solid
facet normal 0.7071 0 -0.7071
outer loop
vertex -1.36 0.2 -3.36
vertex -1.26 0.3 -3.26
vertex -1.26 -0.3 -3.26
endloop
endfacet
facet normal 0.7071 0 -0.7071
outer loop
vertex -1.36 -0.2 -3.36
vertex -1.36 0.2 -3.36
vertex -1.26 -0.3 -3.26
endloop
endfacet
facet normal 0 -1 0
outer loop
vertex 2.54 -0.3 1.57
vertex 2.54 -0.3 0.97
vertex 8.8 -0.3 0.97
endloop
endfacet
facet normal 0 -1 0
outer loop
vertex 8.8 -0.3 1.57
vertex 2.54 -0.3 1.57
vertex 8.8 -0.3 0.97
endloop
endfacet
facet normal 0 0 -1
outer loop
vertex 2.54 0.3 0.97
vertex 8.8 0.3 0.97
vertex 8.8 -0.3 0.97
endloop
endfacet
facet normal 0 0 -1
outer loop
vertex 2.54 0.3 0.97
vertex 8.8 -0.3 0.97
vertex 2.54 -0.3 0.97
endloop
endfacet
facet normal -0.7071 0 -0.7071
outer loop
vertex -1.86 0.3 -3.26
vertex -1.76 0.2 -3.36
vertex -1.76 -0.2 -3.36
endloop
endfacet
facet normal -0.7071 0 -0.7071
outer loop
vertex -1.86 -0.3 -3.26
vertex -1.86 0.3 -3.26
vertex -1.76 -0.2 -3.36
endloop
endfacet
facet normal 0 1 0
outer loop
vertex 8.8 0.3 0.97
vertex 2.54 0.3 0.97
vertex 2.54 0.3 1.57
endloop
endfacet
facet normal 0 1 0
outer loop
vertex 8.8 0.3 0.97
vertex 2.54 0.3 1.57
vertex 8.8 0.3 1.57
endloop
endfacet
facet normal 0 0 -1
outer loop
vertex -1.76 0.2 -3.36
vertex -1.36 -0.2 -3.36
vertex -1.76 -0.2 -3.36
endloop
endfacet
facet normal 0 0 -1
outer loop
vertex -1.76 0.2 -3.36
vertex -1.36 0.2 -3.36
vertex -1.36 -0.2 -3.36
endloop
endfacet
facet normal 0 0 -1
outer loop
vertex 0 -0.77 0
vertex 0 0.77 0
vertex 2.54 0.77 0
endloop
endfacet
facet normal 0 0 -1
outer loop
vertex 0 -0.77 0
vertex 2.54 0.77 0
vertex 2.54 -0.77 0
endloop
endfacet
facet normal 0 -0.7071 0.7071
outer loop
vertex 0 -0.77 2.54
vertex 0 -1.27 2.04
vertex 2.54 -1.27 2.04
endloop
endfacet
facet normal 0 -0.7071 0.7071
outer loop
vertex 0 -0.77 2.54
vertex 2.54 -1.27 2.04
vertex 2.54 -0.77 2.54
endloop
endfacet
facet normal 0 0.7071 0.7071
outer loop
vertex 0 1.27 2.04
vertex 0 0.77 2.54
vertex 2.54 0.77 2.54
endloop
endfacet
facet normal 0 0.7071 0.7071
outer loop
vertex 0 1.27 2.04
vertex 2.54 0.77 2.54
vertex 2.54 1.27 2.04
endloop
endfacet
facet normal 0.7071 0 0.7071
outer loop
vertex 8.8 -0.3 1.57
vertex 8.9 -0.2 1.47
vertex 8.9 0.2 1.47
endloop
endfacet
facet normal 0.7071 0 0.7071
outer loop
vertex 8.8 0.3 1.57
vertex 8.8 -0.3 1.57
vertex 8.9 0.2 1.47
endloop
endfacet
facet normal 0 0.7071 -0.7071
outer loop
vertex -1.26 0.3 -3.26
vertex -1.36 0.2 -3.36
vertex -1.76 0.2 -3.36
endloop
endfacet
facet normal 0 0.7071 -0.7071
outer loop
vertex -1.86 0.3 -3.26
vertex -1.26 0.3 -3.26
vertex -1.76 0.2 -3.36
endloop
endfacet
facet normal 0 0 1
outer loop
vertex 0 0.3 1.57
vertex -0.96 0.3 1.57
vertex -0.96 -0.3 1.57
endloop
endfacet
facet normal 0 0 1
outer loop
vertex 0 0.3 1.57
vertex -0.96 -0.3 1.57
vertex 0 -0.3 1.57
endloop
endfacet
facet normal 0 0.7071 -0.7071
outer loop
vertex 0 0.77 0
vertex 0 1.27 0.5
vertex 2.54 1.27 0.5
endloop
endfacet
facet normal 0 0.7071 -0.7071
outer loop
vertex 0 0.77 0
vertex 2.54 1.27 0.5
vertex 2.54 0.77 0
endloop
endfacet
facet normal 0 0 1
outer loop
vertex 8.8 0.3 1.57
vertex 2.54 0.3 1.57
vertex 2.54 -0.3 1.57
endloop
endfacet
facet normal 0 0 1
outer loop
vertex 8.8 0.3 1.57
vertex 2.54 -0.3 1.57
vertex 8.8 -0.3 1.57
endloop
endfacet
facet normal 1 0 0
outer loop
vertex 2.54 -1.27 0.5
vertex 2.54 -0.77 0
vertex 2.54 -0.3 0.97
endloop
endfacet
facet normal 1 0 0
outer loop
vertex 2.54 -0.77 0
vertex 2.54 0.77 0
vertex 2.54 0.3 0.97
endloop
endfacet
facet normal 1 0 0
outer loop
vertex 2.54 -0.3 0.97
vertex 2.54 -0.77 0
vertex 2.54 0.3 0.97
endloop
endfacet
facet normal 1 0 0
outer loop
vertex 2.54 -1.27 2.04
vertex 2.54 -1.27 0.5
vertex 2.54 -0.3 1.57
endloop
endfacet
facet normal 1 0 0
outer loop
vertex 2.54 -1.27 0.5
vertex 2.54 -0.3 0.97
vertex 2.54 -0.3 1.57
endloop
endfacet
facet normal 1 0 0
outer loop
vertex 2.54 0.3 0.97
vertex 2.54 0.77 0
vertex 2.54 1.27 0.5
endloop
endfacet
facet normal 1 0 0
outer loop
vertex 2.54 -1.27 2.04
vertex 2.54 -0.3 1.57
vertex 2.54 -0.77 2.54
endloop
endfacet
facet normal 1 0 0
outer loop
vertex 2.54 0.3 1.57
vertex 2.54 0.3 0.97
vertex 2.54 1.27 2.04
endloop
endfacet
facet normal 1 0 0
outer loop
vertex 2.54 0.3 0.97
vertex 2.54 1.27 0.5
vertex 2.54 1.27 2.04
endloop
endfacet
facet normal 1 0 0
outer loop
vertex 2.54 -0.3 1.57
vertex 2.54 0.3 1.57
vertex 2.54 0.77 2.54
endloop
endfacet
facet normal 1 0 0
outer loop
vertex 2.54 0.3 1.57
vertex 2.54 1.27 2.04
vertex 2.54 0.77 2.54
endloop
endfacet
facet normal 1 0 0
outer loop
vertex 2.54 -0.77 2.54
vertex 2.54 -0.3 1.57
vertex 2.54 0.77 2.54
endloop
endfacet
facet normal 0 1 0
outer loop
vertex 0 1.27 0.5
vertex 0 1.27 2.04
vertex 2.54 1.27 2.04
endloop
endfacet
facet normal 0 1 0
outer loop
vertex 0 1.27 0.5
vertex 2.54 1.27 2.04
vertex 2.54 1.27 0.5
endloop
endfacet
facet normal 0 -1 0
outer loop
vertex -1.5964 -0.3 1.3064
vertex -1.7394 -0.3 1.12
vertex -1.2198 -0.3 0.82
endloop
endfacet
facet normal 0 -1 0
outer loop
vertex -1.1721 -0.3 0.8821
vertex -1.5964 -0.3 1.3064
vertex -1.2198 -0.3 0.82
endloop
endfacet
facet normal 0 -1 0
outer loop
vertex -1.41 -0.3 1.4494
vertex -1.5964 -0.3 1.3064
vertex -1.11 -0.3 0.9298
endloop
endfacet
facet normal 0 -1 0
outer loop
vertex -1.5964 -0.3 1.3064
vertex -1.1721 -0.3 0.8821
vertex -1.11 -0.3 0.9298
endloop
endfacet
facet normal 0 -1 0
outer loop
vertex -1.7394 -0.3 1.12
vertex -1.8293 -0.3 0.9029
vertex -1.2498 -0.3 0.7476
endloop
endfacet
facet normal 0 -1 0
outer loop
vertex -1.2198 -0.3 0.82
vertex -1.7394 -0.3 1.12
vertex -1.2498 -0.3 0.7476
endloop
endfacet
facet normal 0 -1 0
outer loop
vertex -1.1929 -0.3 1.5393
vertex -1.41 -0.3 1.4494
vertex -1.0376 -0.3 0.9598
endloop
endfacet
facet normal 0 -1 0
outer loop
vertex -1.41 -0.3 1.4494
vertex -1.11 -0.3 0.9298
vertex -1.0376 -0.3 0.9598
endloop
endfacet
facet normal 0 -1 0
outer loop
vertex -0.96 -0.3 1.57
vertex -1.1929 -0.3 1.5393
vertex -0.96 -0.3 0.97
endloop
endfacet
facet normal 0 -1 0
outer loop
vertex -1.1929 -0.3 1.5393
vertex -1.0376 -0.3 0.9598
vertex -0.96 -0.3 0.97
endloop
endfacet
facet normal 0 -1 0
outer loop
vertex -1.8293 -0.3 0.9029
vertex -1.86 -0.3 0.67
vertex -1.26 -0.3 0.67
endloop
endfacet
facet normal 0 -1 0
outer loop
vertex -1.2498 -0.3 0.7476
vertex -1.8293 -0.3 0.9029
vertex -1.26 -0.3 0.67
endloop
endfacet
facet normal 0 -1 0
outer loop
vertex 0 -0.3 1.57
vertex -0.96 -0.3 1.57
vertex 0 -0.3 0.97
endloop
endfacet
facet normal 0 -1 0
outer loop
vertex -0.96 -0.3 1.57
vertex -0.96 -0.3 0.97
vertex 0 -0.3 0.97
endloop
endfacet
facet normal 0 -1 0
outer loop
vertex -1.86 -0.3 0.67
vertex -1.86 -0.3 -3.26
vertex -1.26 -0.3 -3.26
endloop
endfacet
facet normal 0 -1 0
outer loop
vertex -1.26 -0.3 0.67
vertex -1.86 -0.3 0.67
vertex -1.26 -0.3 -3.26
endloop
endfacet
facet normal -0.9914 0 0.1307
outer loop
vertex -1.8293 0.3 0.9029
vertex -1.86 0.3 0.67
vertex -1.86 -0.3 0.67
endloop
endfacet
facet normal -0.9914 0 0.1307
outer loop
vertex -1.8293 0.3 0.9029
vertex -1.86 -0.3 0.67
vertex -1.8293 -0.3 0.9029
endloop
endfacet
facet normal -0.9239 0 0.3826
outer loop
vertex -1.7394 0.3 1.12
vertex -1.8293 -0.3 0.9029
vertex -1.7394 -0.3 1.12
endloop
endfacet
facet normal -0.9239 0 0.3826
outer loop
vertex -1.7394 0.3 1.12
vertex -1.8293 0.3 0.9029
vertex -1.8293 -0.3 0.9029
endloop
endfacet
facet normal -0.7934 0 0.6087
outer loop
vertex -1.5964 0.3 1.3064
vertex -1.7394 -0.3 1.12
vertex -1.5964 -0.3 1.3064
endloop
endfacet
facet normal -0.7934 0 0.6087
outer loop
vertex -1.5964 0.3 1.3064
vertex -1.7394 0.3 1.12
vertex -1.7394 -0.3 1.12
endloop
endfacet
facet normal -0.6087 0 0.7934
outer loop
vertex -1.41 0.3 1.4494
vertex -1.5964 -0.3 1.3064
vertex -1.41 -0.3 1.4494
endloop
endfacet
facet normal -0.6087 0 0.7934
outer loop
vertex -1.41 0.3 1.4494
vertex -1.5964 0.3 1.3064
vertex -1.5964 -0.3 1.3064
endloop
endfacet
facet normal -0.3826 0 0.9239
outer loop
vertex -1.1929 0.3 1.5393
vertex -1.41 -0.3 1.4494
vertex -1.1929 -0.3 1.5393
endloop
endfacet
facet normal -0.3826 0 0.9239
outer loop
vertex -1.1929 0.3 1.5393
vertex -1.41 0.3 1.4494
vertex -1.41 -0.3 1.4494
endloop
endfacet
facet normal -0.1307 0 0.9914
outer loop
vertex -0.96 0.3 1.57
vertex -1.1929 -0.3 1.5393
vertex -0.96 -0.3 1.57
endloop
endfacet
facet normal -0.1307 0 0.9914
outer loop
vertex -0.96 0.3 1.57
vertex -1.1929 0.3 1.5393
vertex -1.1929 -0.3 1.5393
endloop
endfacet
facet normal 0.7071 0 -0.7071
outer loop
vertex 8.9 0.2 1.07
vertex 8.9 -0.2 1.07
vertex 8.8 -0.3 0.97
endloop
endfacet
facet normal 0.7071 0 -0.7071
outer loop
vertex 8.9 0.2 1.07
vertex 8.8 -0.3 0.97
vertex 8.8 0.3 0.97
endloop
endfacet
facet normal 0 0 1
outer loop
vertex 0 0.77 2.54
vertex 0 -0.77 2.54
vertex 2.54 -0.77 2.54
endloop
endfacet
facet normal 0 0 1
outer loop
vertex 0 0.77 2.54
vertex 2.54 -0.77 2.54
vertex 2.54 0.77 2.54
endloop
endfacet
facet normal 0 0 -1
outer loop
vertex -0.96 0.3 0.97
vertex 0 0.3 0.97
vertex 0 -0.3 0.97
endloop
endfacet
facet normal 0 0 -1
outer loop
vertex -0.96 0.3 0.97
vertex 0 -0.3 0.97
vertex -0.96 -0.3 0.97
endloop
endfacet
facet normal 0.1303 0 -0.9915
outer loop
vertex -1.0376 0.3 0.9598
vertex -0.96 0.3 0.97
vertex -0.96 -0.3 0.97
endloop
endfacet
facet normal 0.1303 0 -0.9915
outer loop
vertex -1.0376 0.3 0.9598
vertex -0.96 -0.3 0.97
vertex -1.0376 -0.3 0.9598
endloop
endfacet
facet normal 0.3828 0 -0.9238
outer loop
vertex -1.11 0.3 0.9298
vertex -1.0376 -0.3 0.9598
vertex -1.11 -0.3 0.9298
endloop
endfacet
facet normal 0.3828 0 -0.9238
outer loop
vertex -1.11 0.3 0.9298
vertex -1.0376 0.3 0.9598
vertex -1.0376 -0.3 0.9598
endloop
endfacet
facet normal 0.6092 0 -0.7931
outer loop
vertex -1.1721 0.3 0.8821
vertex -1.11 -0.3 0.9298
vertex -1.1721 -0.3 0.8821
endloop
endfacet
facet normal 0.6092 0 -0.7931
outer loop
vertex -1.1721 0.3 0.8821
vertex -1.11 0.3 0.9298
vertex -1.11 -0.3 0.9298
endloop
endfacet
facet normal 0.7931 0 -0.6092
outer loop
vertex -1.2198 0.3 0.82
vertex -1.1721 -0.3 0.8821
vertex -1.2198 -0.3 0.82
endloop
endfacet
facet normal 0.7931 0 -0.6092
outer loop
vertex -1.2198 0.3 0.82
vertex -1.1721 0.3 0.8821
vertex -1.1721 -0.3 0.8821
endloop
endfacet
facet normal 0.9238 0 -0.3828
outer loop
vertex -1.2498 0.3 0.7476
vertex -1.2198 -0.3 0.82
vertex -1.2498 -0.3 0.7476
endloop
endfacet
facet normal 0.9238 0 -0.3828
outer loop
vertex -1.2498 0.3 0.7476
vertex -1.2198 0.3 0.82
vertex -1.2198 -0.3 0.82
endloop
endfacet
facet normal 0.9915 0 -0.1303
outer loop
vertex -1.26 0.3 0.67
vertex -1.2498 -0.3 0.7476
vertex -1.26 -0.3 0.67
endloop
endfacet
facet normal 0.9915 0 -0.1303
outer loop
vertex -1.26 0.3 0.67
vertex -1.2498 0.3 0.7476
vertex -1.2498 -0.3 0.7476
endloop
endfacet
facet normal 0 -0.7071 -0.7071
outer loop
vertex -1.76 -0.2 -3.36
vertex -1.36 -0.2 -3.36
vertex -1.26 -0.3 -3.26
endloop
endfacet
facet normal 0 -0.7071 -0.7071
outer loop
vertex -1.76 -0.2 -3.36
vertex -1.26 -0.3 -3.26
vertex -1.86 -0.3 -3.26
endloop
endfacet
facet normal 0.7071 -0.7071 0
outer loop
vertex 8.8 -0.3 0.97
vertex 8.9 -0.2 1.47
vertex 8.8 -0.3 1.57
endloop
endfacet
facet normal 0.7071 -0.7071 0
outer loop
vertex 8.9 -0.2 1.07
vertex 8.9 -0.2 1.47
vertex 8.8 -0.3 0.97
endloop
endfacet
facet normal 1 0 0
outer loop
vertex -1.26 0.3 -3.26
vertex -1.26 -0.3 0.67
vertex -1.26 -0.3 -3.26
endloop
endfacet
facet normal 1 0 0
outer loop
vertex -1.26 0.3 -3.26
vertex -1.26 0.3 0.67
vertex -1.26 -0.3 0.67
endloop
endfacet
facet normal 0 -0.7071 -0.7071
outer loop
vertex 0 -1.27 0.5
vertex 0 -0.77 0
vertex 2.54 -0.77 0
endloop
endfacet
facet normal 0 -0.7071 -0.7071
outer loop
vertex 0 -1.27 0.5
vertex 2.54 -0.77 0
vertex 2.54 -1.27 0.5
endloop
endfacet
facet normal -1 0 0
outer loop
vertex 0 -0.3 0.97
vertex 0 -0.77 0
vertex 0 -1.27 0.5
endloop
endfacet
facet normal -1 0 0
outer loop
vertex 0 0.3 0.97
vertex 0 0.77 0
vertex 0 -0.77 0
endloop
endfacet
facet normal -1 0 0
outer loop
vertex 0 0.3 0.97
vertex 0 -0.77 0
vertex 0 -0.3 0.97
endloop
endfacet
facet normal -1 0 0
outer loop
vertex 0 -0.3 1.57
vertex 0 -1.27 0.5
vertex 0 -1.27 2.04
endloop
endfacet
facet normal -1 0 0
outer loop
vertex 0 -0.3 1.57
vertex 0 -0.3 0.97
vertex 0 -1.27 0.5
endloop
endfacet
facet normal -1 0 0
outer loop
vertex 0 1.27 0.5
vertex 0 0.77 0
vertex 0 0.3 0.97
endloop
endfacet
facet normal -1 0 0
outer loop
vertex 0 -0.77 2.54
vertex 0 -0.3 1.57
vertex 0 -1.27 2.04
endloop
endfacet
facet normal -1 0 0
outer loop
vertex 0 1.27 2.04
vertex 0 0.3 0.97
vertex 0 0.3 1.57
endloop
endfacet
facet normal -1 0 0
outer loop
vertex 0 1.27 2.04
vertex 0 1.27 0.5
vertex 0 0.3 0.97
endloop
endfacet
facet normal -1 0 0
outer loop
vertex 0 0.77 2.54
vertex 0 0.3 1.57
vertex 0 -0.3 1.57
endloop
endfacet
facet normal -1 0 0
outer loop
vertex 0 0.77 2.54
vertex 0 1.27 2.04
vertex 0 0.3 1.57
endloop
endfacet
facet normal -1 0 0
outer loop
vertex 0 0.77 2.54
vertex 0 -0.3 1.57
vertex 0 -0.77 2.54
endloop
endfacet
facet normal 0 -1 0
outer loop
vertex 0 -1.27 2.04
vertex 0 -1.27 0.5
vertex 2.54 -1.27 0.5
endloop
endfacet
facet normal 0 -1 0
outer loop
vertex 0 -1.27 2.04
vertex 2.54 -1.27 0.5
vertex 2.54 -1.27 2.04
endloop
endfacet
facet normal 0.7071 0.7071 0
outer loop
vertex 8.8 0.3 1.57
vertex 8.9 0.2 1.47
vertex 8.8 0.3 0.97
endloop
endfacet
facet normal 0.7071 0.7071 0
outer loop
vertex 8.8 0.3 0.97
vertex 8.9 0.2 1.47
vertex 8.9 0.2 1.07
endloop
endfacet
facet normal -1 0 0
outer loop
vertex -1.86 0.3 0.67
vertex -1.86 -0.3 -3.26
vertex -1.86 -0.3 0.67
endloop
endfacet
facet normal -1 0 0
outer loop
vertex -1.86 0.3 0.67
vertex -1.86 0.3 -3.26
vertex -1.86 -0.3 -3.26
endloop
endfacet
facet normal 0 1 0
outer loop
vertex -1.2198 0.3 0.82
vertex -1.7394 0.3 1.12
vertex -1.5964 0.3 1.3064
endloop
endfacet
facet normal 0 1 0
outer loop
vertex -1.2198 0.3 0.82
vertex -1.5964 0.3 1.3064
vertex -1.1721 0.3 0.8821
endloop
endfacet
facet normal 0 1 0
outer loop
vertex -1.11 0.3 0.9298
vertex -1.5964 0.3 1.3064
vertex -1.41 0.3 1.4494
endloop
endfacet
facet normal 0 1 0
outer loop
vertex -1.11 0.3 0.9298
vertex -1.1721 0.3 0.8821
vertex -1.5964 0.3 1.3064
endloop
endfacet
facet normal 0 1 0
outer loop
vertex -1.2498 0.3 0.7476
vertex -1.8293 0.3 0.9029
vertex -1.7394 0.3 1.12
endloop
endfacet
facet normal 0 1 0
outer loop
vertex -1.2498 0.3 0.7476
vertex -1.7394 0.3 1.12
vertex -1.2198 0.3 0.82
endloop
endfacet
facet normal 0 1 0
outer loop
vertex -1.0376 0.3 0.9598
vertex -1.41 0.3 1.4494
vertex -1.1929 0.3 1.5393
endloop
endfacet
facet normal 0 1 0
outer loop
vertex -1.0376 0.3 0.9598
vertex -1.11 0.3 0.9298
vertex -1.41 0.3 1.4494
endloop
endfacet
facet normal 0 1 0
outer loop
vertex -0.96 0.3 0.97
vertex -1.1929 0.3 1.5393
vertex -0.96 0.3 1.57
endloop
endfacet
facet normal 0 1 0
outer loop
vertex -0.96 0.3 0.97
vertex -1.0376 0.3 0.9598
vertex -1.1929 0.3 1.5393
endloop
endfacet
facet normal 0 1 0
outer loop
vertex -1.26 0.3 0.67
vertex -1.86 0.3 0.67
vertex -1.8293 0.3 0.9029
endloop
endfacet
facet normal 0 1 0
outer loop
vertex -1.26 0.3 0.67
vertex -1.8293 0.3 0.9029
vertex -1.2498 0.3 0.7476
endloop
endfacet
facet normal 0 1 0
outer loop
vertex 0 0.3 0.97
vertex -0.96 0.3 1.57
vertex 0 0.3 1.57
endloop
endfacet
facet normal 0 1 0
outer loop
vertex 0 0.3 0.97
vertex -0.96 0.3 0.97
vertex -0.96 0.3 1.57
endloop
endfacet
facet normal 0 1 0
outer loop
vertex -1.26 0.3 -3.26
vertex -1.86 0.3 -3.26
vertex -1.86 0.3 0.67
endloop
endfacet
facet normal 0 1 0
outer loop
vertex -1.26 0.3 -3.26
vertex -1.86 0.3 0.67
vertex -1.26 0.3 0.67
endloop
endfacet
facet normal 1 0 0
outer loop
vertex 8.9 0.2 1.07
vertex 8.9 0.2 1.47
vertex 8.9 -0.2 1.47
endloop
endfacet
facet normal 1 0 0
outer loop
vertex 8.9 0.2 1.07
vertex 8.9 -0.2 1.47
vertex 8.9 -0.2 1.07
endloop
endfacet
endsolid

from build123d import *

# Parameters (mm, degrees)
PLASTIC_DEPTH = 2.54
CONTACT_DEPTH = 0.3
CHAMFER1_SIZE = 0.1


with BuildPart() as part:
    # Sketch1 → Plastic (new body)
    with BuildSketch(Plane(origin=(0, 0, 0), x_dir=(0, 0, -1), z_dir=(1, 0, 0))):
        Polygon((-2.04, 1.27), (-0.5, 1.27), (0, 0.77), (0, -0.77), (-0.5, -1.27), (-2.04, -1.27), (-2.54, -0.77), (-2.54, 0.77), align=None)
    extrude(amount=PLASTIC_DEPTH)

    # Sketch2 → Contact (add, symmetric)
    with BuildSketch(Plane(origin=(0, 0, 0), x_dir=(1, 0, 0), z_dir=(0, 1, 0))):
        with BuildLine():
            Line((-1.86, 3.36), (-1.86, -0.67))
            ThreePointArc((-1.86, -0.67), (-1.596396103, -1.306396103), (-0.96, -1.57))
            Line((-0.96, -1.57), (8.9, -1.57))
            Line((8.9, -1.57), (8.9, -0.97))
            Line((8.9, -0.97), (-0.96, -0.97))
            ThreePointArc((-0.96, -0.97), (-1.172132034, -0.882132034), (-1.26, -0.67))
            Line((-1.26, -0.67), (-1.26, 3.36))
            Line((-1.26, 3.36), (-1.86, 3.36))
        make_face()
    extrude(amount=CONTACT_DEPTH, both=True)

    # Chamfer1
    chamfer1_edges = [part.edges().sort_by_distance(p)[0] for p in [
        (8.9, 0, 0.97),
        (8.9, 0.3, 1.27),
        (-1.56, -0.3, -3.36),
        (-1.26, 0, -3.36),
        (-1.86, 0, -3.36),
        (8.9, -0.3, 1.27),
        (8.9, 0, 1.57),
        (-1.56, 0.3, -3.36),
    ]]
    chamfer(chamfer1_edges, length=CHAMFER1_SIZE)


solid = part.part
